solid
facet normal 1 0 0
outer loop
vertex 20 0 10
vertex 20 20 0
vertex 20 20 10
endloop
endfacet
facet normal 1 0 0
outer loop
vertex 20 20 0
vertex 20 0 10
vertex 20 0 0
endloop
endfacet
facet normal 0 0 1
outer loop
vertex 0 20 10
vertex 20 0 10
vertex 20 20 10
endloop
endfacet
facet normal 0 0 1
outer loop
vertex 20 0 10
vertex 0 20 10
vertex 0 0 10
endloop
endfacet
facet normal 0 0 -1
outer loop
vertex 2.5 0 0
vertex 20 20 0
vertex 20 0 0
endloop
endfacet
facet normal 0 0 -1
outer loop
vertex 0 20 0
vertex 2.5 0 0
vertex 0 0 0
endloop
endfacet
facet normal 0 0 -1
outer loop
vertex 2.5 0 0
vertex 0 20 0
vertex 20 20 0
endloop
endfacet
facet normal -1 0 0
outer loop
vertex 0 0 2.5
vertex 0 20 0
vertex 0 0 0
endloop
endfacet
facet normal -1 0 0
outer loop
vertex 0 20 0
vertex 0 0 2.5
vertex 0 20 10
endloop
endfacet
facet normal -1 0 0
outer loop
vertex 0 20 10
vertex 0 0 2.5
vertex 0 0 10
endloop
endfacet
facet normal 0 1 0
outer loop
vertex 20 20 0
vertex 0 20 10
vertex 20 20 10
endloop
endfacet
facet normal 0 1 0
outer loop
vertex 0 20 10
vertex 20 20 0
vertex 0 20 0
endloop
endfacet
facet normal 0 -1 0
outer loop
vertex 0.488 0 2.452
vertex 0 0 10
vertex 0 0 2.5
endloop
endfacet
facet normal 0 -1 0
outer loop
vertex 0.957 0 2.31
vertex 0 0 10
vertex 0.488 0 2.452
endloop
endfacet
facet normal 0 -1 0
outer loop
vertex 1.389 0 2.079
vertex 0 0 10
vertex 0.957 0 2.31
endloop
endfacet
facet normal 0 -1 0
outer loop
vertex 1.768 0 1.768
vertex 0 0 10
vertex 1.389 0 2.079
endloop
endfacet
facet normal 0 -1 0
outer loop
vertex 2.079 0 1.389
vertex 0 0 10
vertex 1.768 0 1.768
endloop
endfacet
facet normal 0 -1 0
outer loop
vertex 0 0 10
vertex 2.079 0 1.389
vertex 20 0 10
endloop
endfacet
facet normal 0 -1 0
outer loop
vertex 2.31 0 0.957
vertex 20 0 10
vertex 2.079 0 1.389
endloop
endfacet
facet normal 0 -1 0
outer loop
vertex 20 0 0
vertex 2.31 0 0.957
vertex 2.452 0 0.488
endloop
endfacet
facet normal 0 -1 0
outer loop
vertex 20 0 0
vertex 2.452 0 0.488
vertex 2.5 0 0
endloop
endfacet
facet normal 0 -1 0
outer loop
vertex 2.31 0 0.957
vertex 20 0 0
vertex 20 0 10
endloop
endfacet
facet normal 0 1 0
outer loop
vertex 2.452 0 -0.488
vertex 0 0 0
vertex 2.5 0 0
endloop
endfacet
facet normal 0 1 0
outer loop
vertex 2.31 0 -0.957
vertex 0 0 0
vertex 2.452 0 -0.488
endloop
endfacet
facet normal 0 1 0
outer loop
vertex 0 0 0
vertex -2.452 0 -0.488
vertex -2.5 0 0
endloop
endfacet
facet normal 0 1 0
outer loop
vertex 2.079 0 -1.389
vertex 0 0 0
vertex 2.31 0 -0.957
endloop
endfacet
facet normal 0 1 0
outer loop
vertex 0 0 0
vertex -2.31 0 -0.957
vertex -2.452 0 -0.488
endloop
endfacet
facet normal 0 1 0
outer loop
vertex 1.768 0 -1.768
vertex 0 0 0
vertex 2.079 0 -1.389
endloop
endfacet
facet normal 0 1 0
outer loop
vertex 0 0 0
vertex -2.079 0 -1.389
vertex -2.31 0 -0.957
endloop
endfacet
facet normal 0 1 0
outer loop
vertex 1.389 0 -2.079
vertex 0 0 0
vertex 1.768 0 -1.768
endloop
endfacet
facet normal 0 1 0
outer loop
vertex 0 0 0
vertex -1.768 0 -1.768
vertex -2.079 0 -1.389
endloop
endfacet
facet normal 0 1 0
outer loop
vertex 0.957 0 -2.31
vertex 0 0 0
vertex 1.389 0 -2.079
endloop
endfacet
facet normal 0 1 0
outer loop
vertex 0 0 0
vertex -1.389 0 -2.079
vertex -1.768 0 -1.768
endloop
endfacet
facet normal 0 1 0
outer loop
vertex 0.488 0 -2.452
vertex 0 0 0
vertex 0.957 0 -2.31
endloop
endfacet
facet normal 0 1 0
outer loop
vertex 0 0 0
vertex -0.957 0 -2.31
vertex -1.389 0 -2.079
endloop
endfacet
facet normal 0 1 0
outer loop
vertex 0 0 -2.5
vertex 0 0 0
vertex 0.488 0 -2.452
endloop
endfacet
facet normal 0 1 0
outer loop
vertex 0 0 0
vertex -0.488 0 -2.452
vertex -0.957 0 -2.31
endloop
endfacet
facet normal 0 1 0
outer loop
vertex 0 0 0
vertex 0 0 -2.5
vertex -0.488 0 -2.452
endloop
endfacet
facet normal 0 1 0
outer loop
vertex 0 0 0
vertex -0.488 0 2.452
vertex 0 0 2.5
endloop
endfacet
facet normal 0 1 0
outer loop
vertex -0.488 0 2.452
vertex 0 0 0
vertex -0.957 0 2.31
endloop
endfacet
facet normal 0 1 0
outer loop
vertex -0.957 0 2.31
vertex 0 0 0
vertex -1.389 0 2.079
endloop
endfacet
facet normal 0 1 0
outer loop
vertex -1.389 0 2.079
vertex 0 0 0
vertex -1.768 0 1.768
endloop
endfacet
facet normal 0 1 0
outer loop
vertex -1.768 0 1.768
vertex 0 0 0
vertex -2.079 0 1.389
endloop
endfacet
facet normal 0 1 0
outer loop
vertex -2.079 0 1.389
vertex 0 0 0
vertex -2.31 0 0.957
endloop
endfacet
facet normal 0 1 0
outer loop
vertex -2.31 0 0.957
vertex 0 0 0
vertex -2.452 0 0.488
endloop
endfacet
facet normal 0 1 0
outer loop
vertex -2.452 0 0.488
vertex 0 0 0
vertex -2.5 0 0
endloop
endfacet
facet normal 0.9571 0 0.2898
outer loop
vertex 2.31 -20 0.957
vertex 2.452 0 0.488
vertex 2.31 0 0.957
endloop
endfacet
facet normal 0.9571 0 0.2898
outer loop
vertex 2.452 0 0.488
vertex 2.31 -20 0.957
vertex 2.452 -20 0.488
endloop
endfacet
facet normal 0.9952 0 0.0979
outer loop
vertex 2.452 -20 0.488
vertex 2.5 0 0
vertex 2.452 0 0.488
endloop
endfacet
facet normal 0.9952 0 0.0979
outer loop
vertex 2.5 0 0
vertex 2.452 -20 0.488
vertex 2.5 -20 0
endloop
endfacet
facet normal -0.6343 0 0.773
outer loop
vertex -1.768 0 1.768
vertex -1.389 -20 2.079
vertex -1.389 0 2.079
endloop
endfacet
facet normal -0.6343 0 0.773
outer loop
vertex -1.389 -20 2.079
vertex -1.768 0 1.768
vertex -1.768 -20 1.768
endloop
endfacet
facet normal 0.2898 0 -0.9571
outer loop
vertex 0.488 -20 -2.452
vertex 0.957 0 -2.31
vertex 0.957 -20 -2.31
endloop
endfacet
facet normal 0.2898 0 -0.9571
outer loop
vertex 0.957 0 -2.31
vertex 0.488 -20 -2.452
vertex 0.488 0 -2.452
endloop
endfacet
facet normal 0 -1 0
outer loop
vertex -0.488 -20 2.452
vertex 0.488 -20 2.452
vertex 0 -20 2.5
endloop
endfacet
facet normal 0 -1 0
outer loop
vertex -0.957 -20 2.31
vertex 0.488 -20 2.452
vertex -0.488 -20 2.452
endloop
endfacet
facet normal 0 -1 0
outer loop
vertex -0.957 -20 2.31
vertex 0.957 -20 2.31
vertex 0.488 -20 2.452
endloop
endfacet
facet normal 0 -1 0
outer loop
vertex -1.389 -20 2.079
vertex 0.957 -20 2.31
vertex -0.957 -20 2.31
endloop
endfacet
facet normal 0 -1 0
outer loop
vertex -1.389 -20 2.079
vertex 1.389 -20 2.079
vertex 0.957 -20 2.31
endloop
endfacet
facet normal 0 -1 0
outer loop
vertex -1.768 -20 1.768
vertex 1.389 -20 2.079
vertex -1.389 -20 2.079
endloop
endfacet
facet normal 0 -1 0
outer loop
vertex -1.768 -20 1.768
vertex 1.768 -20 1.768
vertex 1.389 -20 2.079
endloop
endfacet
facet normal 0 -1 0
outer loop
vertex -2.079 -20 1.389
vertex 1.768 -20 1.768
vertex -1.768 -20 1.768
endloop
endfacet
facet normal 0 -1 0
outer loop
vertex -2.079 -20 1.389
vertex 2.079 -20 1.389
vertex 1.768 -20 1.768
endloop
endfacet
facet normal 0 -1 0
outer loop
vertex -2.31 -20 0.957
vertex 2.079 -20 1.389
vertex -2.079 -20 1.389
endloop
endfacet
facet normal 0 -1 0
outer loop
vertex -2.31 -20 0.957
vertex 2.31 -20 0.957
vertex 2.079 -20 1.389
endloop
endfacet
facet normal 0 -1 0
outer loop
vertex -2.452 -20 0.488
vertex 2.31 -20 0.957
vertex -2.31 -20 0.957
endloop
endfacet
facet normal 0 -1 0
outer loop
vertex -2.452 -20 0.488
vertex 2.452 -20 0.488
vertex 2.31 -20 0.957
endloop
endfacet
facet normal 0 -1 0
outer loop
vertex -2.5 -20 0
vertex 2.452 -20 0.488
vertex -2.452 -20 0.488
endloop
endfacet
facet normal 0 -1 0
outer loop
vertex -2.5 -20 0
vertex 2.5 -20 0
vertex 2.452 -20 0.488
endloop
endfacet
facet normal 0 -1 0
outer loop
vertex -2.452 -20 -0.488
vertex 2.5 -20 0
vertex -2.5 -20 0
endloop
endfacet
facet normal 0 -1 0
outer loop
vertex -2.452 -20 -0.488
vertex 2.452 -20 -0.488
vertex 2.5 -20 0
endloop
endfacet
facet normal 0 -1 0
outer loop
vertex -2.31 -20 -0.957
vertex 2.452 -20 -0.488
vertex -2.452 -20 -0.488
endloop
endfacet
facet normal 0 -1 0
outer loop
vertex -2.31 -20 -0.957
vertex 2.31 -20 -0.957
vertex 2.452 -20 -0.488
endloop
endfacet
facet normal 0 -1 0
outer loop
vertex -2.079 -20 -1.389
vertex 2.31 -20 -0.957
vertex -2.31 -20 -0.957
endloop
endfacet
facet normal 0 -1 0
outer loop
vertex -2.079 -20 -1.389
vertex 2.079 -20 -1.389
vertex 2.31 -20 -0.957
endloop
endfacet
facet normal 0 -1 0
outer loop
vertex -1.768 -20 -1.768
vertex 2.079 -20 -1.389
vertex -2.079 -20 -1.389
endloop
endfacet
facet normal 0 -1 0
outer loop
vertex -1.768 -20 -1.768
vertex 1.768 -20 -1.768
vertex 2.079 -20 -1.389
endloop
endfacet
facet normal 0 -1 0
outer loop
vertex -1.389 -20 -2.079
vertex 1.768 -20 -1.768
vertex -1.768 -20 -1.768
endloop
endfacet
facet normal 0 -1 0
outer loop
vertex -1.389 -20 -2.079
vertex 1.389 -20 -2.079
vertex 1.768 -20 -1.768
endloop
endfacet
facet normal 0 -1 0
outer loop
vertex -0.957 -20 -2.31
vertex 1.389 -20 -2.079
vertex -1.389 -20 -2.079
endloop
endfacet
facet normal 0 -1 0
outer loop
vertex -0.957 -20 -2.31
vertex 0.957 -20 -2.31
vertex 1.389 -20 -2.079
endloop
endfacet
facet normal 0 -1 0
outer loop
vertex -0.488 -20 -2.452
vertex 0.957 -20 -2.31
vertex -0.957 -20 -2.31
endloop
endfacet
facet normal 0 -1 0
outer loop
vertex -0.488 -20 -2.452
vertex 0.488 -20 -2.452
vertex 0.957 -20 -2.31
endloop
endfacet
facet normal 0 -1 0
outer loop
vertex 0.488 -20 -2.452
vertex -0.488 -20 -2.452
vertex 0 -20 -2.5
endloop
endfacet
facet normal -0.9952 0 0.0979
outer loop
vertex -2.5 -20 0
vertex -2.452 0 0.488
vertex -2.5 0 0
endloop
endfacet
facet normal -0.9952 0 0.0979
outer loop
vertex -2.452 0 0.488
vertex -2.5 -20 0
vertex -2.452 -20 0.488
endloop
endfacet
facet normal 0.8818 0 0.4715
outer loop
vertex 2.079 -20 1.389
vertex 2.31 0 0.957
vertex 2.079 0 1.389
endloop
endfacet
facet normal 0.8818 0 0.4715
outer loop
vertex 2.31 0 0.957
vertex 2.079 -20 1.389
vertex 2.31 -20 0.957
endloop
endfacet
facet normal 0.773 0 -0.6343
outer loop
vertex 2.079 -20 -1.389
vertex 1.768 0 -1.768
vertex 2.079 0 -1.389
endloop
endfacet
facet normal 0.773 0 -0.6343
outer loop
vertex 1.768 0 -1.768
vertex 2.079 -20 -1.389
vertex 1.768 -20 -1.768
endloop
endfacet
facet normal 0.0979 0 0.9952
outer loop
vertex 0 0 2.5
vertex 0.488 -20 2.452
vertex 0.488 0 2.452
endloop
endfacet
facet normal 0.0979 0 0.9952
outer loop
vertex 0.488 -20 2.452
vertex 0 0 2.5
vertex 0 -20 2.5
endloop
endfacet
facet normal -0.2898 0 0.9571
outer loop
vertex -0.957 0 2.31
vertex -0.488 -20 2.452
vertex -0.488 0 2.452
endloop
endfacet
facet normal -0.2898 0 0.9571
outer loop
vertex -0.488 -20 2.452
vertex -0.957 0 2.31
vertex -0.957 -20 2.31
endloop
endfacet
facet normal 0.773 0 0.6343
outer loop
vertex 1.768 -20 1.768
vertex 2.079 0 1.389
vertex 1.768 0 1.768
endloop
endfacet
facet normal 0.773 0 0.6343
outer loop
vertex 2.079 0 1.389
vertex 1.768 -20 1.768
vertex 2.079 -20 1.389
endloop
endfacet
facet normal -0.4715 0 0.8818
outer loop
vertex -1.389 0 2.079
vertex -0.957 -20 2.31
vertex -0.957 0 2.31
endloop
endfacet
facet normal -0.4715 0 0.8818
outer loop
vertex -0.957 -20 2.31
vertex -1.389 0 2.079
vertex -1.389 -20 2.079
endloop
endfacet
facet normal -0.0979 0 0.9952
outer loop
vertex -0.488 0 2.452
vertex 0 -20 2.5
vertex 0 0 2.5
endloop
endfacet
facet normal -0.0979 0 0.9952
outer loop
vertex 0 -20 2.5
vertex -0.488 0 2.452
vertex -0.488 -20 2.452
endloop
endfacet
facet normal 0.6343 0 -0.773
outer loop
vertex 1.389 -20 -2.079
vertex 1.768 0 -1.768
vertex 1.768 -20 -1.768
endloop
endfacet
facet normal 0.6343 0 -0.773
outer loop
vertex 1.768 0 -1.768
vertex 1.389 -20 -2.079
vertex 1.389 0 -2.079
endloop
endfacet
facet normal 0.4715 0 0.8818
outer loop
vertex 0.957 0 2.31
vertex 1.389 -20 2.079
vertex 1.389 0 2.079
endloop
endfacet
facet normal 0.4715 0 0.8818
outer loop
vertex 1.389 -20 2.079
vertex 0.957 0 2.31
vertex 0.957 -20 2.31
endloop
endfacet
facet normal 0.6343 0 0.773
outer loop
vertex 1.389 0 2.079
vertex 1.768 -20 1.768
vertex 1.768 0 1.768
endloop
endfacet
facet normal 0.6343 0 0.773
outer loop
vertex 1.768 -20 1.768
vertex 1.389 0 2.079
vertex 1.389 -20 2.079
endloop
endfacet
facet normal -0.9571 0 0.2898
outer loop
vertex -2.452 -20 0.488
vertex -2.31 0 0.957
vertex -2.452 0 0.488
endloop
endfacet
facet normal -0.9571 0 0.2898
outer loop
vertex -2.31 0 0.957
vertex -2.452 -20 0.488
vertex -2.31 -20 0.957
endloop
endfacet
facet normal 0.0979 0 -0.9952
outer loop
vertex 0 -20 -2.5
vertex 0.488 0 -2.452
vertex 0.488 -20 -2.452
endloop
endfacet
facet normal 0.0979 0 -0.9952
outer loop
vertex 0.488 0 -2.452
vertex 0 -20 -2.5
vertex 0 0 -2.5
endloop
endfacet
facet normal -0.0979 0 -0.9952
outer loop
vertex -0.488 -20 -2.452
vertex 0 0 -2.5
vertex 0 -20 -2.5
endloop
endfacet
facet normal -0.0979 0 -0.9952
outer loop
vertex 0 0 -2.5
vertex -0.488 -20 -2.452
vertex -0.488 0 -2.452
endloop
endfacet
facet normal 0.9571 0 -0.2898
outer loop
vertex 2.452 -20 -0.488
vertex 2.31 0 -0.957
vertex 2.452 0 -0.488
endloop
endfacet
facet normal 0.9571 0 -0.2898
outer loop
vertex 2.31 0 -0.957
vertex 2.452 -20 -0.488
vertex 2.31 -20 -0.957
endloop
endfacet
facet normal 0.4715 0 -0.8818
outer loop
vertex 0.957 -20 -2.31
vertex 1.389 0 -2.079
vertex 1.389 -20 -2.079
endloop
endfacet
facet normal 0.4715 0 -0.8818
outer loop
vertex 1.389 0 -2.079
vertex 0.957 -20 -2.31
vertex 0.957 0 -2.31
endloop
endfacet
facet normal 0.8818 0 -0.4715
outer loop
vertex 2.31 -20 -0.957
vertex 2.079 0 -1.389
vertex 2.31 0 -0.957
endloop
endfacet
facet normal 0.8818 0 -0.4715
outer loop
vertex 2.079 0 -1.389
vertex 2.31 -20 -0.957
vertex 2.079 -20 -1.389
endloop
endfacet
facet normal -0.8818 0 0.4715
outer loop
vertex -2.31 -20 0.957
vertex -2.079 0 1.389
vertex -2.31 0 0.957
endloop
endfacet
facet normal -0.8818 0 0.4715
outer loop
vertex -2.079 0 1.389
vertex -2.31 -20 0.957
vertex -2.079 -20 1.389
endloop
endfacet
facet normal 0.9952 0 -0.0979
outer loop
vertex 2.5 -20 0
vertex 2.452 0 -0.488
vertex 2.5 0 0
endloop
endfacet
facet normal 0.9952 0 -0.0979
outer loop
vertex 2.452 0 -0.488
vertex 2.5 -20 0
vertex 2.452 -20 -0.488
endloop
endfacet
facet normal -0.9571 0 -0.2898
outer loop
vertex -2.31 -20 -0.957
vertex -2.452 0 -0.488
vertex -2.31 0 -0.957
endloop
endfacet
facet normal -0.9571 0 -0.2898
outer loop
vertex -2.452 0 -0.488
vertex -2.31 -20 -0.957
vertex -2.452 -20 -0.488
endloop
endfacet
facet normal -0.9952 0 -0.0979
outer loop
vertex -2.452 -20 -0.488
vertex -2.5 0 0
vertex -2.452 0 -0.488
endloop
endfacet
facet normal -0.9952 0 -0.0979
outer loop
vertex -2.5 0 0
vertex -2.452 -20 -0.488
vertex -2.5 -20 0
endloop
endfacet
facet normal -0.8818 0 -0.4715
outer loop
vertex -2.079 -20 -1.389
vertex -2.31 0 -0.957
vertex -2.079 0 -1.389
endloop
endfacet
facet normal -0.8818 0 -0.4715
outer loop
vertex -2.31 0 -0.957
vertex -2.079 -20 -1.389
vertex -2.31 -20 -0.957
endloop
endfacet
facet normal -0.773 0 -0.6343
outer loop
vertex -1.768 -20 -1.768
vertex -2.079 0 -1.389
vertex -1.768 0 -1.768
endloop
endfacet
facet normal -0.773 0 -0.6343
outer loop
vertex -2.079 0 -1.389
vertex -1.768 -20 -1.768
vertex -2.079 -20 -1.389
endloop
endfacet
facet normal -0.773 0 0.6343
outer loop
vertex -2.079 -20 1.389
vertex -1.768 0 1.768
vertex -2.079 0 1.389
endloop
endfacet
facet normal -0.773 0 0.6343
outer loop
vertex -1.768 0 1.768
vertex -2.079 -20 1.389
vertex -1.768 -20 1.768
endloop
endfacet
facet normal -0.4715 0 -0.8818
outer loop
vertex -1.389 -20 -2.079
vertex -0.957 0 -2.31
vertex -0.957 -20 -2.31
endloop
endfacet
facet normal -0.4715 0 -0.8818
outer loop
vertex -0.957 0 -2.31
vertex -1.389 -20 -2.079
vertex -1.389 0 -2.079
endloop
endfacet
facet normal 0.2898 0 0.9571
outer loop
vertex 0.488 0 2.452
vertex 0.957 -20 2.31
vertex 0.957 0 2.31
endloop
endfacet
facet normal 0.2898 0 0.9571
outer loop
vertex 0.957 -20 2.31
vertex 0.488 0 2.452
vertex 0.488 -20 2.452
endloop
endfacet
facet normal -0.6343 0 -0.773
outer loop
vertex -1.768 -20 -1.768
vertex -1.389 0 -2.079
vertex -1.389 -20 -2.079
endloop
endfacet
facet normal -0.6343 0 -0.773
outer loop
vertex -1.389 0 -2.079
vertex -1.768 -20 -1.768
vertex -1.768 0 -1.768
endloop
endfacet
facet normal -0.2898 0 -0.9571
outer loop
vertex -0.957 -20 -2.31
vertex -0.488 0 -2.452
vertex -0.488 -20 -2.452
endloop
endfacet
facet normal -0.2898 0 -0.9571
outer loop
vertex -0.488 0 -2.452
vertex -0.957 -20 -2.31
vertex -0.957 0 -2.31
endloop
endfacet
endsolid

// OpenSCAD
$fa = 1;
$fs = 0.5;
cube([20, 20, 10]);
rotate([90, 0, 0]){
cylinder(20,2.5, 2.5);
};
 
